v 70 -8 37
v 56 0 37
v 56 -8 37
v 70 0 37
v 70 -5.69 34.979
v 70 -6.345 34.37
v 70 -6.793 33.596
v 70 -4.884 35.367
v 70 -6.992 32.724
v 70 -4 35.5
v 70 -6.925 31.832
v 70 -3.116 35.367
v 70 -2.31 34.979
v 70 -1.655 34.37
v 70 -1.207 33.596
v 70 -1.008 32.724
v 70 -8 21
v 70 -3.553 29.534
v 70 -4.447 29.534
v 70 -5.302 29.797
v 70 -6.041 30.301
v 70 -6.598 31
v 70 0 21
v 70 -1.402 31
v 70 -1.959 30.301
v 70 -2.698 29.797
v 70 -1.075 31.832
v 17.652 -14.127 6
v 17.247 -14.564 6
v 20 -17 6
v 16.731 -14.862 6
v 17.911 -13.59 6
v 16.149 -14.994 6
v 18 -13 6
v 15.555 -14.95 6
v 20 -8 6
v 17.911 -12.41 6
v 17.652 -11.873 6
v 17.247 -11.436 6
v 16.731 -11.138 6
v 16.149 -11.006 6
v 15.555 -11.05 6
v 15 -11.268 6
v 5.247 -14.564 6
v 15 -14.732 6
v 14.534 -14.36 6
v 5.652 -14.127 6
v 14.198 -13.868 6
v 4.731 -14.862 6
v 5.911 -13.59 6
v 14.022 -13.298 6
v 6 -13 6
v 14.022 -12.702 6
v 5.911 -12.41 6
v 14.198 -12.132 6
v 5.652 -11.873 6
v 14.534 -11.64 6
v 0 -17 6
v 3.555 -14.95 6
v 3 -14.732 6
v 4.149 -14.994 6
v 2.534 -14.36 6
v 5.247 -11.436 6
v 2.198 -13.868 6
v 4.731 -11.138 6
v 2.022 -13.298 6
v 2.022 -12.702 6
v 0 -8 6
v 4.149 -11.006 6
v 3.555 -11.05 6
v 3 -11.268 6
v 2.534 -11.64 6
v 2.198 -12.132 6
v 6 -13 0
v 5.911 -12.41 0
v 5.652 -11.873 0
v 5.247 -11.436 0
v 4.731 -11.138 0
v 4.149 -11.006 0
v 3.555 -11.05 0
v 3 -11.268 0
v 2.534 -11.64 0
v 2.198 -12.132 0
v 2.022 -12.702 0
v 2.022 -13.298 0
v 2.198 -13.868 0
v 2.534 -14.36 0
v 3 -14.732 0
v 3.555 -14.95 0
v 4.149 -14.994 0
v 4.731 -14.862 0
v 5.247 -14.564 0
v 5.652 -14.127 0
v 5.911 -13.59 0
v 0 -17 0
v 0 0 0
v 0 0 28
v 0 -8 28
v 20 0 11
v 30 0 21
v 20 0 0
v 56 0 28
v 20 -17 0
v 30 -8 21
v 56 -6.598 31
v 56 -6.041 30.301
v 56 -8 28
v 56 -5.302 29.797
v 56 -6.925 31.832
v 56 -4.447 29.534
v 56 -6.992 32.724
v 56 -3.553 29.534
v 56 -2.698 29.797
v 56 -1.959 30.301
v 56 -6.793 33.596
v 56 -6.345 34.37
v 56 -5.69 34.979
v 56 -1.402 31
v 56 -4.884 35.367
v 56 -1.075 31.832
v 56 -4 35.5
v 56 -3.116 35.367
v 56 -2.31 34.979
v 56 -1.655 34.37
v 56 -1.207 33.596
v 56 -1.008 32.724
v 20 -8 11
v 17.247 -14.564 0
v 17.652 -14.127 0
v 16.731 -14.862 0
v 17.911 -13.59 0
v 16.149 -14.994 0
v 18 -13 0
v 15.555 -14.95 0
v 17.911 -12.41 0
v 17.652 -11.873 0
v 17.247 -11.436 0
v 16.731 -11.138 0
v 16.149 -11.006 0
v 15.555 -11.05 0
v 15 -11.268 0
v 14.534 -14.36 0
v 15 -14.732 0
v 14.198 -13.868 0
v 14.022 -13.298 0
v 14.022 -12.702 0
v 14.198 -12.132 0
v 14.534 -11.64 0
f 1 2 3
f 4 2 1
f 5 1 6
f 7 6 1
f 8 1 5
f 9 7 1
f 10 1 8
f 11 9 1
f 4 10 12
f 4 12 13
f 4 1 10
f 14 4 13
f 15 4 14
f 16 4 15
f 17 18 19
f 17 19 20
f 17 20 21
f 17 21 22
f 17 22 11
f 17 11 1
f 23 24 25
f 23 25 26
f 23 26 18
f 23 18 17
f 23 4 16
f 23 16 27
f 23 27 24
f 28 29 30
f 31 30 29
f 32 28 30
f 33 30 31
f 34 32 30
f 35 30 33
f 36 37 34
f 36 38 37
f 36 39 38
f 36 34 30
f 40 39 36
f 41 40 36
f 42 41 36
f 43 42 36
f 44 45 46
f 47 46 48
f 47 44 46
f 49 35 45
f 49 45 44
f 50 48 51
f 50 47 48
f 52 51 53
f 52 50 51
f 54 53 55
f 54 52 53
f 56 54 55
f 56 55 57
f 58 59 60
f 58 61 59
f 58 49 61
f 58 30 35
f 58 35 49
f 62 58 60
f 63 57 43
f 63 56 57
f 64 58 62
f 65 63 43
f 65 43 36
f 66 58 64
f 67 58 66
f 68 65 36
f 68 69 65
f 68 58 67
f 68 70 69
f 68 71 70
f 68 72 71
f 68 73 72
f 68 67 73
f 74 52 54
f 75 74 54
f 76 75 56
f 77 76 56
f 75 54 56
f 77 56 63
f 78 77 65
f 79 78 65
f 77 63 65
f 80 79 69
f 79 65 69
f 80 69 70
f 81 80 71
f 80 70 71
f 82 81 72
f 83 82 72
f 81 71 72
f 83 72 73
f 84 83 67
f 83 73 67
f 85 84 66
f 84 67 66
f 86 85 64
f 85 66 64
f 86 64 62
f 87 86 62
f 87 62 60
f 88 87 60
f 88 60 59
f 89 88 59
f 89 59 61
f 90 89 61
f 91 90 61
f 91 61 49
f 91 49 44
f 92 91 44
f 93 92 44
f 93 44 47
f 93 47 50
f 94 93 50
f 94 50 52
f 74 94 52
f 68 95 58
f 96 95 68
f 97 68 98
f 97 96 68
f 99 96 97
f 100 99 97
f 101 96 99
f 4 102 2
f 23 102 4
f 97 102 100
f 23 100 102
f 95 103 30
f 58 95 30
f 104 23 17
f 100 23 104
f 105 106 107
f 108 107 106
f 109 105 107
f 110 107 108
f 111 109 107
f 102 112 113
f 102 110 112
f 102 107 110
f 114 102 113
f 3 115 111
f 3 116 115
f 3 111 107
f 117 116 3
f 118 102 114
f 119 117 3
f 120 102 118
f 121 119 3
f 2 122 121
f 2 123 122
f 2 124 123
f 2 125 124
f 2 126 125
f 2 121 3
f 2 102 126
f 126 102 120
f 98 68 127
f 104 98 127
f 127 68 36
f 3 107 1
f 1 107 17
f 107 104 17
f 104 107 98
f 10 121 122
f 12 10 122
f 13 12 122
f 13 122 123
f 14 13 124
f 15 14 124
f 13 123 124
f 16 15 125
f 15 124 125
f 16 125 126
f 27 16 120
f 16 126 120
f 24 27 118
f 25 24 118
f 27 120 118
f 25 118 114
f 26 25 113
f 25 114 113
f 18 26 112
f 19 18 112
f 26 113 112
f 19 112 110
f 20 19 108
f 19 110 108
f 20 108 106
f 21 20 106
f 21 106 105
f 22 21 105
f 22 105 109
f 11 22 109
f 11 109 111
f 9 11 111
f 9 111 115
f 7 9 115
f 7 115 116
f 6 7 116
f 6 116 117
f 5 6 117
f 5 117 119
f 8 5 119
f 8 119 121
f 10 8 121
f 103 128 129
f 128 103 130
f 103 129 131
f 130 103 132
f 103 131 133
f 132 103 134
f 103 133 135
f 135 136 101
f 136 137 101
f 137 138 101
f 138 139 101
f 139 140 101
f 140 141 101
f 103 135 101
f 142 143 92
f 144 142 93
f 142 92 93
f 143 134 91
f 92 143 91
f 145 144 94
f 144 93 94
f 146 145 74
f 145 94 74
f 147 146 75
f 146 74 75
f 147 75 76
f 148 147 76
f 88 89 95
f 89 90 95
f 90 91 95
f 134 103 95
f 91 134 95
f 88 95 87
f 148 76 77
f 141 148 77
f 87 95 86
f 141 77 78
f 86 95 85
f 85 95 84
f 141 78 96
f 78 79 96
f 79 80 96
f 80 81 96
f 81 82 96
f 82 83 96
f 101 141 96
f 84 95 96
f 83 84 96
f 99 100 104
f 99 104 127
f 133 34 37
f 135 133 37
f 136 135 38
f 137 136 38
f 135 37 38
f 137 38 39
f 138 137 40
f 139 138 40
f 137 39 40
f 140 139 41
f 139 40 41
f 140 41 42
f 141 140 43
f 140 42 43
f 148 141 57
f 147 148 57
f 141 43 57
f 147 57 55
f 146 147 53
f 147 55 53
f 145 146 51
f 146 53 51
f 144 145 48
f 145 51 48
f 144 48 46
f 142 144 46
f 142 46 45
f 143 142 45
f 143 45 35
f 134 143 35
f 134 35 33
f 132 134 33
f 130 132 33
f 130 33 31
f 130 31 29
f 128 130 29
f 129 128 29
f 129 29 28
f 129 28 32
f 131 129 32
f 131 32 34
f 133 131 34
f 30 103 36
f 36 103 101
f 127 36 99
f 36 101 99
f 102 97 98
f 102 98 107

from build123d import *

# Parameters (mm, degrees)
BOSS_EXTRUDE1_DEPTH = 8
SKETCH2_W           = 6
SKETCH2_H           = 9
BOSS_EXTRUDE2_DEPTH = 20
CUT_EXTRUDE1_REACH  = 71.239
SKETCH3_R           = 3
SKETCH4_R           = 2
CUT_EXTRUDE2_DEPTH  = 10


with BuildPart() as part:
    # Sketch1 → Boss-Extrude1 (new body)
    with BuildSketch(Plane(origin=(0, 0, 0), x_dir=(1, 0, 0), z_dir=(0, 1, 0))):
        Polygon((0, 0), (0, -28), (56, -28), (56, -37), (70, -37), (70, -21), (30, -21), (20, -11), (20, 0), align=None)
    extrude(amount=-BOSS_EXTRUDE1_DEPTH)

    # Sketch2 → Boss-Extrude2 (add)
    with BuildSketch(Plane.ZY):
        with Locations((3, -12.5)):
            Rectangle(SKETCH2_W, SKETCH2_H)
    extrude(amount=-BOSS_EXTRUDE2_DEPTH)

    # Sketch3 → Cut-Extrude1 (cut, up to next)
    with BuildSketch(Plane.ZY.offset(-56), mode=Mode.PRIVATE) as cut_extrude1_sk1:
        with Locations((32.5, -4)):
            Circle(SKETCH3_R)
    cut_extrude1_tool1 = extrude(cut_extrude1_sk1.sketch, amount=-CUT_EXTRUDE1_REACH, mode=Mode.PRIVATE) & part.part
    add(cut_extrude1_tool1.solids().sort_by_distance((56, -4, 32.5))[0], mode=Mode.SUBTRACT)

    # Sketch4 → Cut-Extrude2 (cut)
    with BuildSketch(Plane.XY.offset(6)):
        with Locations((4, -13)):
            Circle(SKETCH4_R)
        with Locations((16, -13)):
            Circle(SKETCH4_R)
    extrude(amount=-CUT_EXTRUDE2_DEPTH, mode=Mode.SUBTRACT)


solid = part.part
